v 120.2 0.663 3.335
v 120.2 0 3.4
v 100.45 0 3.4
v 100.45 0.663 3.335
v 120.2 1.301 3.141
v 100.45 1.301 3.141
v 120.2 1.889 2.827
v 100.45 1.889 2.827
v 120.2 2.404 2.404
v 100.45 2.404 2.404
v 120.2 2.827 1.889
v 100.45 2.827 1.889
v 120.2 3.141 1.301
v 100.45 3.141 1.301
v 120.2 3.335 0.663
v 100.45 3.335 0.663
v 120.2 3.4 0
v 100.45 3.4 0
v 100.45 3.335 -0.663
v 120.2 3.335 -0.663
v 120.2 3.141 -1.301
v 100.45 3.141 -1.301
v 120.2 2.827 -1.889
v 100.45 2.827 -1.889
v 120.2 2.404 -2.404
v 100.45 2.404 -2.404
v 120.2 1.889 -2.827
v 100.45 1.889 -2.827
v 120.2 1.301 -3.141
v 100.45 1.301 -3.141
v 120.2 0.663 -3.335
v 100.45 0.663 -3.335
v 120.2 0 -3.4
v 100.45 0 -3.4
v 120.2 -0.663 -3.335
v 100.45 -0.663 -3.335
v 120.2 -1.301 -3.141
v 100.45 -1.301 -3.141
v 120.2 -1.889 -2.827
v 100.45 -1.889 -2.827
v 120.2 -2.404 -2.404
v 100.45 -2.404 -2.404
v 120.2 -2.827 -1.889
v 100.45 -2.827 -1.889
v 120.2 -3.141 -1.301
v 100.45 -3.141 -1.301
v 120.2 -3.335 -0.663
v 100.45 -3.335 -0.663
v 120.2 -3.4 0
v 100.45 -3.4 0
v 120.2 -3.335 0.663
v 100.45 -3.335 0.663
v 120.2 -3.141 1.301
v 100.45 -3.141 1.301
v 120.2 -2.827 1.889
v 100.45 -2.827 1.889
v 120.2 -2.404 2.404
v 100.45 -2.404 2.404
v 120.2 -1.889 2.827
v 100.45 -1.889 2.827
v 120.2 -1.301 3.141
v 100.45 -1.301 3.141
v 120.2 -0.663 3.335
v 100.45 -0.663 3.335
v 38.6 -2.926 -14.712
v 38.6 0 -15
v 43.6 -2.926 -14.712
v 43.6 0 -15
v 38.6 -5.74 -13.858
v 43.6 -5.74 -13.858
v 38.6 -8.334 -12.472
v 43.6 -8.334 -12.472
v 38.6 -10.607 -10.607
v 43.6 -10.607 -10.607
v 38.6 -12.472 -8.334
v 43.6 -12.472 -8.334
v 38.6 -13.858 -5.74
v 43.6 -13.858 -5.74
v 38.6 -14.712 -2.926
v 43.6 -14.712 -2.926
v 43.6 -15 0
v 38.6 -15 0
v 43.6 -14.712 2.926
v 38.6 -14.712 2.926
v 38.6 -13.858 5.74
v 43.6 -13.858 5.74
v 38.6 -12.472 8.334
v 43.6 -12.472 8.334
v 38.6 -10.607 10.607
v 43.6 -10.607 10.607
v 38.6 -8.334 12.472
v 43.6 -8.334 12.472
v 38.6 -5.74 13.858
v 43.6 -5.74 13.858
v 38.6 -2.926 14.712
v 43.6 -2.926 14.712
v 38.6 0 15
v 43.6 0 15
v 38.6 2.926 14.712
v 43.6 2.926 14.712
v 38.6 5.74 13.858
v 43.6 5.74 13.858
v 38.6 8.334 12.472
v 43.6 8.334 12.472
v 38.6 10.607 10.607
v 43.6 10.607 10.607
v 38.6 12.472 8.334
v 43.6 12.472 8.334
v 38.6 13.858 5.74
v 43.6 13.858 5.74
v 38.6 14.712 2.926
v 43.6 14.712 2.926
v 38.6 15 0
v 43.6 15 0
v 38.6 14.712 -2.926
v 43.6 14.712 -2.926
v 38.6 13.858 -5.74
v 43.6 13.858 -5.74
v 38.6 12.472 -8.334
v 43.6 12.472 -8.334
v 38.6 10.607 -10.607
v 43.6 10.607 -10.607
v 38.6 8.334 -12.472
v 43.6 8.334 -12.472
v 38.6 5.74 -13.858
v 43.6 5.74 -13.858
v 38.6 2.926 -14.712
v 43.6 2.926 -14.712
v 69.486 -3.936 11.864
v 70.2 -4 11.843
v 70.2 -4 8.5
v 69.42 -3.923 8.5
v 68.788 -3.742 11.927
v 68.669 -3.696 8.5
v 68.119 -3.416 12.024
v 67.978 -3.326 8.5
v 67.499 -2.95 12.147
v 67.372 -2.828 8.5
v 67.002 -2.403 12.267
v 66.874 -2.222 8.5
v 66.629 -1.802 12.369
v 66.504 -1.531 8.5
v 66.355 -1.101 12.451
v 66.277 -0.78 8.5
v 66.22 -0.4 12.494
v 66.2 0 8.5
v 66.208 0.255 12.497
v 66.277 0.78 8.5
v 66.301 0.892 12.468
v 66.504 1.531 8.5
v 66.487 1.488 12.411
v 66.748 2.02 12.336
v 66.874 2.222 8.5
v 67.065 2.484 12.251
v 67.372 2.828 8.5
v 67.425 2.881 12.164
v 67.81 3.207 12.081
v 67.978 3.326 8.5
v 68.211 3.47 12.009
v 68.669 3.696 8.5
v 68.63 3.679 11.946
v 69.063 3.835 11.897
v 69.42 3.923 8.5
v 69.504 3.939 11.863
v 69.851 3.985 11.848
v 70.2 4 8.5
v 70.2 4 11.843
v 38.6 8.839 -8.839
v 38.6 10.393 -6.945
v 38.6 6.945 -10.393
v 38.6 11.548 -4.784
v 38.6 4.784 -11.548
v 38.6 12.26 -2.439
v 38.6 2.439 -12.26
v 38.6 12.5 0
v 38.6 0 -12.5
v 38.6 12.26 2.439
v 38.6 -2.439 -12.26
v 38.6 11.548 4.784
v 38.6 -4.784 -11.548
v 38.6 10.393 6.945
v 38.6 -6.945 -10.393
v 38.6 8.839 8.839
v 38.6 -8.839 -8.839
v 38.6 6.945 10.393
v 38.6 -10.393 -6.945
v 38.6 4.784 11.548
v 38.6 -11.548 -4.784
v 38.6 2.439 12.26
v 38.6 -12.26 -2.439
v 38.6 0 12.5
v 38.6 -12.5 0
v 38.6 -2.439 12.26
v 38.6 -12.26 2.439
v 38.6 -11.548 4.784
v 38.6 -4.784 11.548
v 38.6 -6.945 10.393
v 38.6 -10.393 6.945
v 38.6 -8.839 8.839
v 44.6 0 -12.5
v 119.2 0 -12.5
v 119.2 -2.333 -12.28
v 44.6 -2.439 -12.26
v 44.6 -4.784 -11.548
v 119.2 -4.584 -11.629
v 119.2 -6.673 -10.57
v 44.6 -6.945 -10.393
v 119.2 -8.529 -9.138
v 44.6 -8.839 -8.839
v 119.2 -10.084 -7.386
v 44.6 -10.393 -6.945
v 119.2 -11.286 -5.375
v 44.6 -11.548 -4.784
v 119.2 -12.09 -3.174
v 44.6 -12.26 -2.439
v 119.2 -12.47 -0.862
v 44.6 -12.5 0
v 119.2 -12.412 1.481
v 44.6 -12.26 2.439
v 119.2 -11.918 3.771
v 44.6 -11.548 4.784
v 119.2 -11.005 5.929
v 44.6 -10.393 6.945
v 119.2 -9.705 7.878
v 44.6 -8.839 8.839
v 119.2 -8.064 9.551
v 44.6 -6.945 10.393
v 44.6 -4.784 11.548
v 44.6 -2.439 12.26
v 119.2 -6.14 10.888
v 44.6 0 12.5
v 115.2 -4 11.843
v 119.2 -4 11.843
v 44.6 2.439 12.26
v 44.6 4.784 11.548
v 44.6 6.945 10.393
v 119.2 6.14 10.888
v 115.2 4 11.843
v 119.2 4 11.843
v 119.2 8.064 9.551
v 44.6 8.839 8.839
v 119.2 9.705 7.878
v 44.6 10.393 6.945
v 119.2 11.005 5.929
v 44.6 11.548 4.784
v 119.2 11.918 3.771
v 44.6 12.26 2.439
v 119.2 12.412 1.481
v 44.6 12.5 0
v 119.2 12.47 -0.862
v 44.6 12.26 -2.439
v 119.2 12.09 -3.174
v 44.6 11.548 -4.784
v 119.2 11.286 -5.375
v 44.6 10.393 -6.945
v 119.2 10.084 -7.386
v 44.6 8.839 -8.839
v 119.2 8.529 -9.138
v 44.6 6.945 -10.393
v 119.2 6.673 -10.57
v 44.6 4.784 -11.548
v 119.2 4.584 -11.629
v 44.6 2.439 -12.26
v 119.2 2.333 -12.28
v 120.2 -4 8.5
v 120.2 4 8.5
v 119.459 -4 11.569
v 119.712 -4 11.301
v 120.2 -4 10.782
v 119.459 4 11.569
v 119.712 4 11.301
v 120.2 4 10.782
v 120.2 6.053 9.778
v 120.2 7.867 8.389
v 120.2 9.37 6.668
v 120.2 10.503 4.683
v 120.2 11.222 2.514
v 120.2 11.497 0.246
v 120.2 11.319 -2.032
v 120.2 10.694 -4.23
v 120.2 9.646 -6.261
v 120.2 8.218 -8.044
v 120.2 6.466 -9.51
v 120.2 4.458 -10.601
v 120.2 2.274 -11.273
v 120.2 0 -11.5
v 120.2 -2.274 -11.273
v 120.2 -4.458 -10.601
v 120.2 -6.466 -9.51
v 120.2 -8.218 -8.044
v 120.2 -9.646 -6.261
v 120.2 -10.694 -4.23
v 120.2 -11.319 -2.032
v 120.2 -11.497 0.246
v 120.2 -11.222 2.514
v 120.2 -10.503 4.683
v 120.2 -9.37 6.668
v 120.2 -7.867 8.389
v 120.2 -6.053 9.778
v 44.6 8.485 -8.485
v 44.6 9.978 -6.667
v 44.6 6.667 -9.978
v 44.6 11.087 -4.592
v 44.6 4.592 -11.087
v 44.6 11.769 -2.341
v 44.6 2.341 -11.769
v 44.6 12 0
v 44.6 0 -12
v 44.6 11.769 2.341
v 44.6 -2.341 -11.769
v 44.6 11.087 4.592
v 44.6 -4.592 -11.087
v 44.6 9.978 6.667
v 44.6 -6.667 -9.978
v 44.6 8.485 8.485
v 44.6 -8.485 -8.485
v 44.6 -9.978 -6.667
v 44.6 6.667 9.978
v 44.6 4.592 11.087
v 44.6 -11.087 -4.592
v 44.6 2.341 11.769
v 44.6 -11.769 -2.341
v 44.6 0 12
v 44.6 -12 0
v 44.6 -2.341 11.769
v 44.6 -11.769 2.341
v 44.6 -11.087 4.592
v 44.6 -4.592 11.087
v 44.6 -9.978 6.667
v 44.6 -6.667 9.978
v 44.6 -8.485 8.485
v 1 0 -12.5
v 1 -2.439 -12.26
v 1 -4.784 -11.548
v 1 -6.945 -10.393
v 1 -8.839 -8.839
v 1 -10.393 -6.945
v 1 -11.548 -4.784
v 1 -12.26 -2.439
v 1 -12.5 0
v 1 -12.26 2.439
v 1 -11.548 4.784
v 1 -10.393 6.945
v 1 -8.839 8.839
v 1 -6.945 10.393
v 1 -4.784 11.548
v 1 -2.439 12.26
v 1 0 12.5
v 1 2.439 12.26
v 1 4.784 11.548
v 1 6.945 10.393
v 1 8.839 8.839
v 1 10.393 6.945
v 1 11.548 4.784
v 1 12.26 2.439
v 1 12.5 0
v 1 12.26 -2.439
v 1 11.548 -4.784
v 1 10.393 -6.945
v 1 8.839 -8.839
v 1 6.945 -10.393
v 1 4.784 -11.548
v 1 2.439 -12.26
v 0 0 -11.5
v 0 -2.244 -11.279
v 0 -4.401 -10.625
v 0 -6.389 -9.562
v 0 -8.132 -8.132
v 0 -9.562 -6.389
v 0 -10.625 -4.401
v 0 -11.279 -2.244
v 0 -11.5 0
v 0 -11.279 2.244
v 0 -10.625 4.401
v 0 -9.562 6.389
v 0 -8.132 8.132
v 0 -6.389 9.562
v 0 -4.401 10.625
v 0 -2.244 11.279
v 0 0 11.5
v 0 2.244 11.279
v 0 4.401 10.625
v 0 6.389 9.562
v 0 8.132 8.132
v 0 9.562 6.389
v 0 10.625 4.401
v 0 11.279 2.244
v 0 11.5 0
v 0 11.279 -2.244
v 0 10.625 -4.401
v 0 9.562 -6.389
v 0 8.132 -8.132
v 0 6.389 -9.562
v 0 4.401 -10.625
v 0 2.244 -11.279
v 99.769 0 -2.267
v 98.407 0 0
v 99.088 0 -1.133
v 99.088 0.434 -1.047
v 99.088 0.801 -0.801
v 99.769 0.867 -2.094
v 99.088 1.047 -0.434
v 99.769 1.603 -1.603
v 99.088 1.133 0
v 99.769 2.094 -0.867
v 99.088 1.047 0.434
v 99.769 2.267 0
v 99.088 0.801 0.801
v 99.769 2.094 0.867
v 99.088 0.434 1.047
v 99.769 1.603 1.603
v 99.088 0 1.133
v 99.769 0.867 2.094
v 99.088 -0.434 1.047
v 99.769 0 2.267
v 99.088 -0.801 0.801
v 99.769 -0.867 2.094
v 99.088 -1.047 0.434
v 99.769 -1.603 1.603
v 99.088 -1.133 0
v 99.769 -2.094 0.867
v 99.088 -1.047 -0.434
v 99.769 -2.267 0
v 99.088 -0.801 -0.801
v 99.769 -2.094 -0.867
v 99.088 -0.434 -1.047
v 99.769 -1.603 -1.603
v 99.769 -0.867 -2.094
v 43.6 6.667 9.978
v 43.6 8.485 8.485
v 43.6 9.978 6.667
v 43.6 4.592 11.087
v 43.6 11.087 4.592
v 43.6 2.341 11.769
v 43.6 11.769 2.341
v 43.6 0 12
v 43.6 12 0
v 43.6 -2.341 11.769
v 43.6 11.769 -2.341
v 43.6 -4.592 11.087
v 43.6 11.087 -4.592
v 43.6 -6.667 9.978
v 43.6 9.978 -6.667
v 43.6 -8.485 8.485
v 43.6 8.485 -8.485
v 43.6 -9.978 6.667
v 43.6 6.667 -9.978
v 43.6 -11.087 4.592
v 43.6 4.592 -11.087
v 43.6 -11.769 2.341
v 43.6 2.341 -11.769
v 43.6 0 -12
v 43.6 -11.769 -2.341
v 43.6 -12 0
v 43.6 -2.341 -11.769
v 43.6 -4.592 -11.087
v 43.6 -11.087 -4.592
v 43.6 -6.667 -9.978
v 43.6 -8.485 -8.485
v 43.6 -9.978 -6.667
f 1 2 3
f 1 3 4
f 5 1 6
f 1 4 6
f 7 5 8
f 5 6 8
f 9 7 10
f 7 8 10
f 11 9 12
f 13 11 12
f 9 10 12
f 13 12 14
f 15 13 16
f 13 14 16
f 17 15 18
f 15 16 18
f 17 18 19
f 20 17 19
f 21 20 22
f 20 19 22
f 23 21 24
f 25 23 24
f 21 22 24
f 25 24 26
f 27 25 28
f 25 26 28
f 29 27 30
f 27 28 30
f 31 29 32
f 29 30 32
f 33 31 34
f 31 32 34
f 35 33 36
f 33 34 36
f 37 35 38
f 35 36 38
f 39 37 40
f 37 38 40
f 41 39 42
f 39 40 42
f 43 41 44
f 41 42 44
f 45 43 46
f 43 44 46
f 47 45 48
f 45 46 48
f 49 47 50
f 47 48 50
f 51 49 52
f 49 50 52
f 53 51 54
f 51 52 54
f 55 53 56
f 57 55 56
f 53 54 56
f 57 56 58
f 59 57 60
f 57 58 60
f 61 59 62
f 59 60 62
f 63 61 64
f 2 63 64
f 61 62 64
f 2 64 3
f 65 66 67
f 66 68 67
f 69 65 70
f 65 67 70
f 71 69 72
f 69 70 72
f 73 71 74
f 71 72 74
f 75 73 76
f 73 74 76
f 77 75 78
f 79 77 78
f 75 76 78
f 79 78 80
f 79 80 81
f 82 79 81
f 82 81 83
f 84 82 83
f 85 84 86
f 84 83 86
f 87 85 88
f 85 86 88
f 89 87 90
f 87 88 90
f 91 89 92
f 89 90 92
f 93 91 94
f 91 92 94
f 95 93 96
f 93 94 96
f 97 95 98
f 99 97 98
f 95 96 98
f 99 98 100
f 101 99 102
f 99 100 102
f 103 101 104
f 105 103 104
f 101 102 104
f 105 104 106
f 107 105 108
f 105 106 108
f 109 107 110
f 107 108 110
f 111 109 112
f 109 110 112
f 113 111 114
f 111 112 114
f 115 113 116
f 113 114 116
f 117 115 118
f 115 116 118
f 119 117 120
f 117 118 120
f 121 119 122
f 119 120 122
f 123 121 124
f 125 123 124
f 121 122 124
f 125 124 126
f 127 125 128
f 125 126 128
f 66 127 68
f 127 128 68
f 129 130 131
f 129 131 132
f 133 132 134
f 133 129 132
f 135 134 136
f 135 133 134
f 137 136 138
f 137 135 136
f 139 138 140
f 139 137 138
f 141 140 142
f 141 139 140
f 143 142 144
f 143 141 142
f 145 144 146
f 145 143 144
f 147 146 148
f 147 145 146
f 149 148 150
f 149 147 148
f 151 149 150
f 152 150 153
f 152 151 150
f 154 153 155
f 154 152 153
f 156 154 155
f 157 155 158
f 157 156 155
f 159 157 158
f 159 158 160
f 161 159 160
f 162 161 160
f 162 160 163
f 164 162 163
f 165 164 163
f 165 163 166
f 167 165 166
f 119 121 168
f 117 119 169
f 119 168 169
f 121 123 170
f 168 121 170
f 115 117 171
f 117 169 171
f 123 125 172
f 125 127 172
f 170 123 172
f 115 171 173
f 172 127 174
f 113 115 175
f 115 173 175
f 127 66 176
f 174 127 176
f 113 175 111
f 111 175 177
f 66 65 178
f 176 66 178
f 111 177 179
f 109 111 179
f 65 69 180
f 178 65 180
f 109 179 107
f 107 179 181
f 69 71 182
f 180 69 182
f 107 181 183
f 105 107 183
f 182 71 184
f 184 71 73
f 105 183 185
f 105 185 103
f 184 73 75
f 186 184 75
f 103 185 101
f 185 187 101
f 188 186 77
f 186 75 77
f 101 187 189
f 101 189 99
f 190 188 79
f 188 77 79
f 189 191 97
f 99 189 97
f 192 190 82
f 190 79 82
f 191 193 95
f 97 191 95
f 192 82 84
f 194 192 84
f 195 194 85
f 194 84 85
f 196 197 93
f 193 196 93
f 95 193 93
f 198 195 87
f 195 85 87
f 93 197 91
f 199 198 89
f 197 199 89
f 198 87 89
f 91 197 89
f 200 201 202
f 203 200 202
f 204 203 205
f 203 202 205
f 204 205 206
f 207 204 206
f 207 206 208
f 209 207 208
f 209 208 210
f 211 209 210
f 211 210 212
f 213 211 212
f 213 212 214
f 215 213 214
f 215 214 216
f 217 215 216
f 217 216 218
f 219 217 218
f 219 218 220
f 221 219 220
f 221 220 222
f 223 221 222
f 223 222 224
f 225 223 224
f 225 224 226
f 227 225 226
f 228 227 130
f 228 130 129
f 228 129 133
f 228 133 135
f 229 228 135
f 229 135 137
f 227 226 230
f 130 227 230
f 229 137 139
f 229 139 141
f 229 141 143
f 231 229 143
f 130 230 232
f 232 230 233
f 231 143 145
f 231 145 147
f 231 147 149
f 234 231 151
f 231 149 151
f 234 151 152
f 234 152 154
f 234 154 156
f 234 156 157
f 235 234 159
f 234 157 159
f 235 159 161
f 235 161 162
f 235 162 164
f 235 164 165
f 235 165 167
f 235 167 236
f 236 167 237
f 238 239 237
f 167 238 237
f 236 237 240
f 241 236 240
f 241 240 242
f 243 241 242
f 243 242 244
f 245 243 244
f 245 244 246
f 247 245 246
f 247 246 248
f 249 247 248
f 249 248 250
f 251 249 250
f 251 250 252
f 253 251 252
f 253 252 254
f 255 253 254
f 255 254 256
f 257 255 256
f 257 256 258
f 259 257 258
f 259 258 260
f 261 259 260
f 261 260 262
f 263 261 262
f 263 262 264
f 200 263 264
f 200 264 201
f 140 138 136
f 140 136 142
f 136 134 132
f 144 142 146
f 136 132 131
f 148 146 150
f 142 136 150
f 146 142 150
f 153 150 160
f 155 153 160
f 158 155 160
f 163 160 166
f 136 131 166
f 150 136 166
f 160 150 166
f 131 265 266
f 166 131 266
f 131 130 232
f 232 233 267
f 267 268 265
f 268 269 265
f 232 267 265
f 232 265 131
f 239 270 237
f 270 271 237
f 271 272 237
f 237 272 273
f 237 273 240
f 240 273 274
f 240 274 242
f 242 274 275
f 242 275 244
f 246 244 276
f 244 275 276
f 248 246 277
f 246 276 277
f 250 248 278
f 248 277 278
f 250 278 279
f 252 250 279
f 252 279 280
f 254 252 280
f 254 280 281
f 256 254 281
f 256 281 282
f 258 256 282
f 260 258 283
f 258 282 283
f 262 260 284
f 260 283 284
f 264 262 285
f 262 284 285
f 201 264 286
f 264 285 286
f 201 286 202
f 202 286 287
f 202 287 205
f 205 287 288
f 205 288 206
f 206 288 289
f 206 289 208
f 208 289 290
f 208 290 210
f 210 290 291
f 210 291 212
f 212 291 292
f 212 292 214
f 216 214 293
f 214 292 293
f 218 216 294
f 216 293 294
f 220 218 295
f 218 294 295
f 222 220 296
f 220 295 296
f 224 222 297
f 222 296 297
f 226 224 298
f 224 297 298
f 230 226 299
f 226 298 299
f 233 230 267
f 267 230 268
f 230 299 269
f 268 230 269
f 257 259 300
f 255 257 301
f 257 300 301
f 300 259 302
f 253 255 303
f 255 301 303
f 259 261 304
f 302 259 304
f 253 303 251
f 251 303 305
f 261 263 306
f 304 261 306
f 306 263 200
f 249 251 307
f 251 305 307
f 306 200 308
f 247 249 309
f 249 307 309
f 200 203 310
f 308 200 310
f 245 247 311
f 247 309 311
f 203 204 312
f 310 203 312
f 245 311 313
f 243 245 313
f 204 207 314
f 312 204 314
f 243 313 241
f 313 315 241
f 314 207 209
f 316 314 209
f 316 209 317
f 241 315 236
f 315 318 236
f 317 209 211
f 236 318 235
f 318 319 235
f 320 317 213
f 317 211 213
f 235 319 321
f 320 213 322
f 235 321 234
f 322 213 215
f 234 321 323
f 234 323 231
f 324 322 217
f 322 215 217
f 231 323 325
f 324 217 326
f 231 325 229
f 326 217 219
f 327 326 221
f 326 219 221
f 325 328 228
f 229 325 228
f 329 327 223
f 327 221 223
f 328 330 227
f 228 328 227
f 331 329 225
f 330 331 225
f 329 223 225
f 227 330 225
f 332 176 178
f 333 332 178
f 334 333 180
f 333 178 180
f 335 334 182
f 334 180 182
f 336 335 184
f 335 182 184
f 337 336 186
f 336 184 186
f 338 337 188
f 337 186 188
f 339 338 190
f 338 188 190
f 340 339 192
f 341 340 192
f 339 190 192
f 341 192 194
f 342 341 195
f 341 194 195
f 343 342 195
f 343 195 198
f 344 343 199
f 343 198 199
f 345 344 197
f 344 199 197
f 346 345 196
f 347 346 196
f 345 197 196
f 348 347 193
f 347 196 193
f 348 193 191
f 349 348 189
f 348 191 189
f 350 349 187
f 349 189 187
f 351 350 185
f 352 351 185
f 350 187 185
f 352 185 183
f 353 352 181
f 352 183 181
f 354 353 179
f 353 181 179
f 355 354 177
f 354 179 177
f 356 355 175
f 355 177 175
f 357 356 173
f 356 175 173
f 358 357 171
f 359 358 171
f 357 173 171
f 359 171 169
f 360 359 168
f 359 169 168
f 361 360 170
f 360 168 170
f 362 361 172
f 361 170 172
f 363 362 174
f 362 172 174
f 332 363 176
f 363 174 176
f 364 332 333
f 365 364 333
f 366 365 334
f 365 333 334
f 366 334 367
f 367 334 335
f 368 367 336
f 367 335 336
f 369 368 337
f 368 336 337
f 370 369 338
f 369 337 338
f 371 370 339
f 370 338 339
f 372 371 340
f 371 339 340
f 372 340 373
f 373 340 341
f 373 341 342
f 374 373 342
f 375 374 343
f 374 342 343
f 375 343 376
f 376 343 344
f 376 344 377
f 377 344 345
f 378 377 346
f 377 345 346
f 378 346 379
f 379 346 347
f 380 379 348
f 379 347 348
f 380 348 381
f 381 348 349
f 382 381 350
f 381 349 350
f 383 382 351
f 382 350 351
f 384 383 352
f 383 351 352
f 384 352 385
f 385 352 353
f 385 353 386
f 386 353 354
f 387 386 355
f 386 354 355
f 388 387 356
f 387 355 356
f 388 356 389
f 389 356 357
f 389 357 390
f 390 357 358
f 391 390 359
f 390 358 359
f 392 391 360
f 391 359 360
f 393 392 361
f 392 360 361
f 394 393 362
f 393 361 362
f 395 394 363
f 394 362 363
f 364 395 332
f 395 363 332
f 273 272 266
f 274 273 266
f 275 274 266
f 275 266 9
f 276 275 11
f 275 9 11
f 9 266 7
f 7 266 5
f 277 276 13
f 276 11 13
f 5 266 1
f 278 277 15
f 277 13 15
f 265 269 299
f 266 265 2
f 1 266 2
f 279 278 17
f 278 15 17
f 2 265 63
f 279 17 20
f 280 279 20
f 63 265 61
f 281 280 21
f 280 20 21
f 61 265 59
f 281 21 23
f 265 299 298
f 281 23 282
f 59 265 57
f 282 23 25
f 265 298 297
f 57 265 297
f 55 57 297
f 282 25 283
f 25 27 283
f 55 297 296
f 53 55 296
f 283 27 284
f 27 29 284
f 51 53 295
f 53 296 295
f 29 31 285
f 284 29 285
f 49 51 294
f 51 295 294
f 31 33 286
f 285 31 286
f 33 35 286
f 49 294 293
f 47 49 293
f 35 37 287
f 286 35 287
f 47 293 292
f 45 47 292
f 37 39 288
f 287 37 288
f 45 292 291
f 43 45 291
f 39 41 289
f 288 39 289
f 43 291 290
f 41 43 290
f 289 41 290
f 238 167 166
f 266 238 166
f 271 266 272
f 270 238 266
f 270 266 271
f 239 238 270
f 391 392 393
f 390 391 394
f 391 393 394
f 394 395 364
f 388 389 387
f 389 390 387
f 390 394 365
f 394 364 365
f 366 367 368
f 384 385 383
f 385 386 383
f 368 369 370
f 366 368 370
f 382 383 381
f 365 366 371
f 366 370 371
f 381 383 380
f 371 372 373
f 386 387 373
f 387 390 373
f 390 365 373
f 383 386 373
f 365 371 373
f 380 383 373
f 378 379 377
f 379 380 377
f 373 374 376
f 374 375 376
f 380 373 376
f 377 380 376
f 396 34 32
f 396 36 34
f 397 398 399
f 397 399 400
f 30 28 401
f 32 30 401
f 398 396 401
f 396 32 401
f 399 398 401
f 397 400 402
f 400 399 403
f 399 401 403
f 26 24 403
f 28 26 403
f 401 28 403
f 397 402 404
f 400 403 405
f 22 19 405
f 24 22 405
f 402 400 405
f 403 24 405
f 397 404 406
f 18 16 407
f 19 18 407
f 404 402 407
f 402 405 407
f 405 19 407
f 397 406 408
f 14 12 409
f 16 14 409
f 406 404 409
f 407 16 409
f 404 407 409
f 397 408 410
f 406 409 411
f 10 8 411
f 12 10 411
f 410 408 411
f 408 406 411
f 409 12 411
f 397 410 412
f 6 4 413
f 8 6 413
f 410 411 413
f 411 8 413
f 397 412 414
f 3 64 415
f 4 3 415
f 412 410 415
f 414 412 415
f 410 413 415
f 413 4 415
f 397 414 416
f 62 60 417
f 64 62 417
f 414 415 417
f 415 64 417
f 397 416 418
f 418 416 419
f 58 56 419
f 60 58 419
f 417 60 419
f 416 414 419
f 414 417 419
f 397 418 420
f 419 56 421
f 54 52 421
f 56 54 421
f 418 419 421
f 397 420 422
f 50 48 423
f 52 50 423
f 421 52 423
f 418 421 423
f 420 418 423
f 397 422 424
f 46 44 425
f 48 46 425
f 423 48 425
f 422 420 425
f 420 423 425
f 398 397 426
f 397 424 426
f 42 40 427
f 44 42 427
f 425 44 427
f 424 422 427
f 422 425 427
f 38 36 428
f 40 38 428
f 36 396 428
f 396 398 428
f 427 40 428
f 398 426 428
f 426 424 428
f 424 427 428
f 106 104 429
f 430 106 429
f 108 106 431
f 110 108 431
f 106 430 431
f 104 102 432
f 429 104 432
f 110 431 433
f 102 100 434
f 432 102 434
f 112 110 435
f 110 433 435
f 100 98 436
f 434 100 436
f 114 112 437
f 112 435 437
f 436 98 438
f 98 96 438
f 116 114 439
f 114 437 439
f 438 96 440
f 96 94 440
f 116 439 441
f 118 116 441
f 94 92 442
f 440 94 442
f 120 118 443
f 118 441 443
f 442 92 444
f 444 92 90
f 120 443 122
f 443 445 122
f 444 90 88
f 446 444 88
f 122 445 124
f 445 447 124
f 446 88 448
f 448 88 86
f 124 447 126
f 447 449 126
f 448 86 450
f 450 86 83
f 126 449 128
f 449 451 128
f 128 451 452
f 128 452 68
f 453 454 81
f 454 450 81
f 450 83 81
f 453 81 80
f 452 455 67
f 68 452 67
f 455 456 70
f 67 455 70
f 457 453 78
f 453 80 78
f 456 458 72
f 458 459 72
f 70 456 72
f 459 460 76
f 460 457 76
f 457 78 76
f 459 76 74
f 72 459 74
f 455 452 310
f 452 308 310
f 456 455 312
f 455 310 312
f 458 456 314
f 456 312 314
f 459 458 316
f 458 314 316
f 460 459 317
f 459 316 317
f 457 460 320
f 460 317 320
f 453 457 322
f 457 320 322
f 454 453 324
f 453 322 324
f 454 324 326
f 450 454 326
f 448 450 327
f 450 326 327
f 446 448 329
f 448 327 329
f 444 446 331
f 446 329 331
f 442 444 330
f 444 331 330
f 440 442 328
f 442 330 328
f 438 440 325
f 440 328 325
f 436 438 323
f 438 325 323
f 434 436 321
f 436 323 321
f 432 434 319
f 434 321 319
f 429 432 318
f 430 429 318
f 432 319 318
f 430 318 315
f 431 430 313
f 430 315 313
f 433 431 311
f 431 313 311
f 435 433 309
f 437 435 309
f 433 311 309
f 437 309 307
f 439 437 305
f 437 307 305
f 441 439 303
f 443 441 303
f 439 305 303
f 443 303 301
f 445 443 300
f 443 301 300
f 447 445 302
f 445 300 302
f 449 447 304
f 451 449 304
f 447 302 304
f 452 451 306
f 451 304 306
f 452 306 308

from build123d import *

# Parameters (mm, degrees)
CHAMFER1_SIZE         = 1
CUT_EXTRUDE1_DEPTH    = 4
CUT_EXTRUDE2_DEPTH    = 10
M8_TAPPED_HOLE1_D     = 6.8
M8_TAPPED_HOLE1_DEPTH = 19.75
M8_TAPPED_HOLE1_TIP   = 2.042926105
CHAMFER2_SIZE         = 1


with BuildPart() as part:
    # Sketch1 → Revolve1 (revolve)
    with BuildSketch(Plane.XY, mode=Mode.PRIVATE) as revolve1_sk:
        Polygon((0, 0), (0, 12.5), (38.6, 12.5), (38.6, 15), (43.6, 15), (43.6, 12), (44.6, 12), (44.6, 12.5), (120.2, 12.5), (120.2, 0), align=None)
    revolve(revolve1_sk.sketch.rotate(Axis((0, 0, 0), (-1, 0, 0)), 90), axis=Axis((0, 0, 0), (-1, 0, 0)))

    # Chamfer1
    chamfer1_edges = [part.edges().sort_by_distance(p)[0] for p in [
        (0, 0, 12.5),
    ]]
    chamfer(chamfer1_edges, length=CHAMFER1_SIZE)

    # Sketch3 → Cut-Extrude1 (cut)
    with BuildSketch(Plane(origin=(120.2, 2.936266506, 12.5), x_dir=(1, 0, 0), z_dir=(0, 0, -1))):
        with BuildLine():
            Line((-5, 6.936266506), (-50, 6.936266506))
            ThreePointArc((-50, 6.936266506), (-54, 2.936266506), (-50, -1.063733494))
            Line((-50, -1.063733494), (-5, -1.063733494))
            ThreePointArc((-5, -1.063733494), (-1, 2.936266506), (-5, 6.936266506))
        make_face()
    extrude(amount=CUT_EXTRUDE1_DEPTH, mode=Mode.SUBTRACT)

    # Sketch4 → Cut-Extrude2 (cut)
    with BuildSketch(Plane(origin=(120.2, 0, 0), x_dir=(0, 0, -1), z_dir=(1, 0, 0))):
        with BuildLine():
            Line((-8.5, -4), (-8.5, 4))
            Line((-8.5, 4), (-11.842719282, 4))
            ThreePointArc((-11.842719282, 4), (-12.5, 0), (-11.842719282, -4))
            Line((-11.842719282, -4), (-8.5, -4))
        make_face()
    extrude(amount=-CUT_EXTRUDE2_DEPTH, mode=Mode.SUBTRACT)

    # M8 Tapped Hole1
    with Locations(Plane(origin=(120.2, 0, 0), x_dir=(0, 0, -1), z_dir=(1, 0, 0))):
        with Locations((0, 0)):
            Hole(M8_TAPPED_HOLE1_D / 2, depth=M8_TAPPED_HOLE1_DEPTH)
            with Locations((0, 0, -(M8_TAPPED_HOLE1_DEPTH + M8_TAPPED_HOLE1_TIP / 2))):  # 118° drill point
                Cone(0, M8_TAPPED_HOLE1_D / 2, M8_TAPPED_HOLE1_TIP, mode=Mode.SUBTRACT)

    # Chamfer2
    chamfer2_edges = [part.edges().sort_by_distance(p)[0] for p in [
        (120.2, 12.33458534, -2.026821276),
    ]]
    chamfer(chamfer2_edges, length=CHAMFER2_SIZE)


solid = part.part
